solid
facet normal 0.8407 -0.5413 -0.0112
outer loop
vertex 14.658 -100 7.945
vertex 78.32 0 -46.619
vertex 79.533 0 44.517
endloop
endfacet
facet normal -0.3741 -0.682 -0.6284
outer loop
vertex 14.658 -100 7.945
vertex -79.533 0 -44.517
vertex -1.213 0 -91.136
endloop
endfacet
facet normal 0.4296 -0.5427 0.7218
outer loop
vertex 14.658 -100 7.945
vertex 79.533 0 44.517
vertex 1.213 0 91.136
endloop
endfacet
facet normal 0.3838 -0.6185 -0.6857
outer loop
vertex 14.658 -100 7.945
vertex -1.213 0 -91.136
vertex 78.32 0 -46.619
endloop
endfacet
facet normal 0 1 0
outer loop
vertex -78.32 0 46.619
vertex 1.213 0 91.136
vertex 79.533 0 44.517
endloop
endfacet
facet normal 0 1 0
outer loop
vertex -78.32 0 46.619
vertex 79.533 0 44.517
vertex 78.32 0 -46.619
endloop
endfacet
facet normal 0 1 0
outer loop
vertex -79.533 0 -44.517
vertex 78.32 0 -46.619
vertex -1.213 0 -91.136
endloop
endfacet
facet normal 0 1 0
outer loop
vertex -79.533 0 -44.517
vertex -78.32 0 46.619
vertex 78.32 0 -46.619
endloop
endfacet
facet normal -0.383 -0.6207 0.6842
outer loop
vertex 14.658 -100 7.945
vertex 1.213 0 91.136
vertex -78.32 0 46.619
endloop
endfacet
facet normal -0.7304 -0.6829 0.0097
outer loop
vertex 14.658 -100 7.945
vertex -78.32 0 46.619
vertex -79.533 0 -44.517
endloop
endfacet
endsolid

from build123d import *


with BuildPart() as f3:
    # F0 (on Front) → F3 section 0
    with BuildSketch(Plane.XZ, mode=Mode.PRIVATE) as f3_s0:
        Polygon((1.213273, 91.136256), (-78.319676, 46.618853), (-79.532949, -44.517403), (-1.213273, -91.136256), (78.319676, -46.618853), (79.532949, 44.517403), align=None)
    loft([f3_s0.sketch, Vertex(14.658035, -100, 7.94503)])


solid = f3.part
